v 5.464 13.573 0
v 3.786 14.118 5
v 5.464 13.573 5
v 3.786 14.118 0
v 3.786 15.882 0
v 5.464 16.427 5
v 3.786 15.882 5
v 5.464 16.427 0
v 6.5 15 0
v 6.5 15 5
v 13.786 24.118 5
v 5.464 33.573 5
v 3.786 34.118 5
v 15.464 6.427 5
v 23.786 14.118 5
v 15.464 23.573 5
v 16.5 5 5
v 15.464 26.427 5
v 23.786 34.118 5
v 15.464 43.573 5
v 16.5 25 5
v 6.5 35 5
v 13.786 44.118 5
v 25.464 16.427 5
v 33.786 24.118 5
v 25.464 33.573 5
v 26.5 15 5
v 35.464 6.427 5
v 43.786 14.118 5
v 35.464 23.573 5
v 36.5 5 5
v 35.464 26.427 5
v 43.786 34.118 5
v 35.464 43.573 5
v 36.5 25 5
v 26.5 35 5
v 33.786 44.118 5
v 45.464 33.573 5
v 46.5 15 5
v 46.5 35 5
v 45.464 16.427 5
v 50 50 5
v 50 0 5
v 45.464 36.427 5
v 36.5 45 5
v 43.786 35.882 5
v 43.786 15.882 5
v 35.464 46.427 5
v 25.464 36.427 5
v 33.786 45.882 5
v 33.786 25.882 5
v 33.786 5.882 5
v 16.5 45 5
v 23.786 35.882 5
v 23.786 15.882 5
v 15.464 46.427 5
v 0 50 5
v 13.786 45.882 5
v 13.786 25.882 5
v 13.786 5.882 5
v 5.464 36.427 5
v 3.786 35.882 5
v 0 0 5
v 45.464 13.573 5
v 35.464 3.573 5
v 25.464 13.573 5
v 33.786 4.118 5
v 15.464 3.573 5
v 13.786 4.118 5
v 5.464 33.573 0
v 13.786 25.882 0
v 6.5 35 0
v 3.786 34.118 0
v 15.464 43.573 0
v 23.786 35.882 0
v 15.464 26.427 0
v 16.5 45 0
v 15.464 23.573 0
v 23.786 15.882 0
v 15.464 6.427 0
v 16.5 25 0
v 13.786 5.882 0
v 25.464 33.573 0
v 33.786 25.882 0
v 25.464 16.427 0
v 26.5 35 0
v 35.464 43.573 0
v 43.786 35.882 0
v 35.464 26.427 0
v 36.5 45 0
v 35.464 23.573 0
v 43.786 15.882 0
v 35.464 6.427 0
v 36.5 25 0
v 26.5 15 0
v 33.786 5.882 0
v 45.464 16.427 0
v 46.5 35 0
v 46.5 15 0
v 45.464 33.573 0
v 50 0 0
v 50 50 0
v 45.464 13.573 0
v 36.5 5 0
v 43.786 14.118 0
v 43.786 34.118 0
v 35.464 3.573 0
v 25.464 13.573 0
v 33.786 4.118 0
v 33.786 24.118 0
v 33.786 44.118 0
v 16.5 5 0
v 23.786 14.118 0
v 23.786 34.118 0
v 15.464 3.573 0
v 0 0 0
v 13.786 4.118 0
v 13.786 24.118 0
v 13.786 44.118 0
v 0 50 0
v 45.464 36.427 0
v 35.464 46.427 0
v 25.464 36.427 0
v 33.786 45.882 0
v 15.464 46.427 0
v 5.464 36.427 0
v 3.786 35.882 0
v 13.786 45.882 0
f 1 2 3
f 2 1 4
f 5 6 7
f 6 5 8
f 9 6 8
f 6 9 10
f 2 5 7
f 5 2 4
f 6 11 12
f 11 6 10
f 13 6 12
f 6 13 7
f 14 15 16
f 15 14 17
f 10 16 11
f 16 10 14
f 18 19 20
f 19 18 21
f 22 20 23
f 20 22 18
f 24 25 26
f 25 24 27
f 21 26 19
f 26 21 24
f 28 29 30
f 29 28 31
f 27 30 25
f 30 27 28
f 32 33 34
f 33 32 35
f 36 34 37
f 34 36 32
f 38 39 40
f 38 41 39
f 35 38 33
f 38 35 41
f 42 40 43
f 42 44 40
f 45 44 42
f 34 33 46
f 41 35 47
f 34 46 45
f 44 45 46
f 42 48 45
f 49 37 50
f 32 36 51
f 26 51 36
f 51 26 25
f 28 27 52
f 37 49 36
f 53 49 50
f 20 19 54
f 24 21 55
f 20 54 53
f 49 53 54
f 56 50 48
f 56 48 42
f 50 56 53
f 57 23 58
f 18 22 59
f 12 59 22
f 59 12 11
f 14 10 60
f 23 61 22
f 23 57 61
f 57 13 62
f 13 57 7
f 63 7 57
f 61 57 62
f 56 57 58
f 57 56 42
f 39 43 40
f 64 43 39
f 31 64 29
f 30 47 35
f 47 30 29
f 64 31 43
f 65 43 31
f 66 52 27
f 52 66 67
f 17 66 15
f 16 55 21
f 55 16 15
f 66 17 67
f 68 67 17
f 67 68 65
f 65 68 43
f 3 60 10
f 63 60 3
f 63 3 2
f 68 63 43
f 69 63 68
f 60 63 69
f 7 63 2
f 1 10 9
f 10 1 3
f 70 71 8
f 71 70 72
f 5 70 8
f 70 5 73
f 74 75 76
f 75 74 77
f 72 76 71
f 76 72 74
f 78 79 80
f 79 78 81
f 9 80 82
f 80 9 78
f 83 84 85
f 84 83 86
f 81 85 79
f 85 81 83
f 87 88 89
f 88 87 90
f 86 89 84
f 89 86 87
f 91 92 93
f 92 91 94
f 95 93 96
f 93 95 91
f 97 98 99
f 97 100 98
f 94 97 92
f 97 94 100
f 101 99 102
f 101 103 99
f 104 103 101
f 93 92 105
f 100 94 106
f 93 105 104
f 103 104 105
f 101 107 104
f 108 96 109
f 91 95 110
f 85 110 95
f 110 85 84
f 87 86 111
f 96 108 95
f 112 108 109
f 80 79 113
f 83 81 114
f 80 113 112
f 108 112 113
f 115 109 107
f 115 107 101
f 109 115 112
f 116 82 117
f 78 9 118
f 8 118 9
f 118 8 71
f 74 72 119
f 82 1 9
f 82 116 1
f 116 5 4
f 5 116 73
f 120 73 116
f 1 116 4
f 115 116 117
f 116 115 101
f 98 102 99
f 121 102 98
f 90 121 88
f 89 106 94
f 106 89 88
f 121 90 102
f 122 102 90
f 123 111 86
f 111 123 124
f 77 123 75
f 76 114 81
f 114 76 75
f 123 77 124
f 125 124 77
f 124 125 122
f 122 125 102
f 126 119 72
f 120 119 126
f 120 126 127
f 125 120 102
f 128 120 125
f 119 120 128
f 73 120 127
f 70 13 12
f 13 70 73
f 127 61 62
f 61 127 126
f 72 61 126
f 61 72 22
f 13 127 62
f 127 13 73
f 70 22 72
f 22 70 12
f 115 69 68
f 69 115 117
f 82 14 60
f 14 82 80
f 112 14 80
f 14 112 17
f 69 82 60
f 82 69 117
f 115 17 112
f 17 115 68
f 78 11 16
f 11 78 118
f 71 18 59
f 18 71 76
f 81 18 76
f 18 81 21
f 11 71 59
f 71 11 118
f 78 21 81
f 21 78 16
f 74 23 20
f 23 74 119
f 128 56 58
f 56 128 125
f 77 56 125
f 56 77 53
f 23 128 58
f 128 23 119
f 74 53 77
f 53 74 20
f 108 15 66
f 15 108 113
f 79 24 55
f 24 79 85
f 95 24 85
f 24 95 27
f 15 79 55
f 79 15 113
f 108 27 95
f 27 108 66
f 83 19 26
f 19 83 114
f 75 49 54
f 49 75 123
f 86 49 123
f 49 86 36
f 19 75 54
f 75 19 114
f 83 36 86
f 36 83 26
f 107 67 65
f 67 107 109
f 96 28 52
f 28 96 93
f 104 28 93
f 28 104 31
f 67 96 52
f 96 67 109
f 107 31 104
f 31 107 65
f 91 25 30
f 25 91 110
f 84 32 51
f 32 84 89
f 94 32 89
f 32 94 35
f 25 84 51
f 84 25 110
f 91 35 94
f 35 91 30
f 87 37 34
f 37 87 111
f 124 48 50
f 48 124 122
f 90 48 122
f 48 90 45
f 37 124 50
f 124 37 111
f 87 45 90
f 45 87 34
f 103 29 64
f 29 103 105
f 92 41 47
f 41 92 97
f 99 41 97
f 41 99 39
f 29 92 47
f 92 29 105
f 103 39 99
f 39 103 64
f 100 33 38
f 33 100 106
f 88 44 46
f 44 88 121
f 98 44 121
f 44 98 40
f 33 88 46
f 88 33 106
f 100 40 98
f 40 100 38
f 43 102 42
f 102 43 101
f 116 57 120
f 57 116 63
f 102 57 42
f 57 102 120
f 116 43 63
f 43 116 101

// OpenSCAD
module perforaciones() {
    for (x = [5:10:45]) {
        for (y = [5:10:45]) {
            if ((x + y) % 20 == 0) { // Solo en posiciones alternas
                translate([x, y, 0])
                    cylinder(h=5, d=3);
            }
        }
    }
}

difference() {
    cube([50, 50, 5]);  // Placa base
    perforaciones();
}
